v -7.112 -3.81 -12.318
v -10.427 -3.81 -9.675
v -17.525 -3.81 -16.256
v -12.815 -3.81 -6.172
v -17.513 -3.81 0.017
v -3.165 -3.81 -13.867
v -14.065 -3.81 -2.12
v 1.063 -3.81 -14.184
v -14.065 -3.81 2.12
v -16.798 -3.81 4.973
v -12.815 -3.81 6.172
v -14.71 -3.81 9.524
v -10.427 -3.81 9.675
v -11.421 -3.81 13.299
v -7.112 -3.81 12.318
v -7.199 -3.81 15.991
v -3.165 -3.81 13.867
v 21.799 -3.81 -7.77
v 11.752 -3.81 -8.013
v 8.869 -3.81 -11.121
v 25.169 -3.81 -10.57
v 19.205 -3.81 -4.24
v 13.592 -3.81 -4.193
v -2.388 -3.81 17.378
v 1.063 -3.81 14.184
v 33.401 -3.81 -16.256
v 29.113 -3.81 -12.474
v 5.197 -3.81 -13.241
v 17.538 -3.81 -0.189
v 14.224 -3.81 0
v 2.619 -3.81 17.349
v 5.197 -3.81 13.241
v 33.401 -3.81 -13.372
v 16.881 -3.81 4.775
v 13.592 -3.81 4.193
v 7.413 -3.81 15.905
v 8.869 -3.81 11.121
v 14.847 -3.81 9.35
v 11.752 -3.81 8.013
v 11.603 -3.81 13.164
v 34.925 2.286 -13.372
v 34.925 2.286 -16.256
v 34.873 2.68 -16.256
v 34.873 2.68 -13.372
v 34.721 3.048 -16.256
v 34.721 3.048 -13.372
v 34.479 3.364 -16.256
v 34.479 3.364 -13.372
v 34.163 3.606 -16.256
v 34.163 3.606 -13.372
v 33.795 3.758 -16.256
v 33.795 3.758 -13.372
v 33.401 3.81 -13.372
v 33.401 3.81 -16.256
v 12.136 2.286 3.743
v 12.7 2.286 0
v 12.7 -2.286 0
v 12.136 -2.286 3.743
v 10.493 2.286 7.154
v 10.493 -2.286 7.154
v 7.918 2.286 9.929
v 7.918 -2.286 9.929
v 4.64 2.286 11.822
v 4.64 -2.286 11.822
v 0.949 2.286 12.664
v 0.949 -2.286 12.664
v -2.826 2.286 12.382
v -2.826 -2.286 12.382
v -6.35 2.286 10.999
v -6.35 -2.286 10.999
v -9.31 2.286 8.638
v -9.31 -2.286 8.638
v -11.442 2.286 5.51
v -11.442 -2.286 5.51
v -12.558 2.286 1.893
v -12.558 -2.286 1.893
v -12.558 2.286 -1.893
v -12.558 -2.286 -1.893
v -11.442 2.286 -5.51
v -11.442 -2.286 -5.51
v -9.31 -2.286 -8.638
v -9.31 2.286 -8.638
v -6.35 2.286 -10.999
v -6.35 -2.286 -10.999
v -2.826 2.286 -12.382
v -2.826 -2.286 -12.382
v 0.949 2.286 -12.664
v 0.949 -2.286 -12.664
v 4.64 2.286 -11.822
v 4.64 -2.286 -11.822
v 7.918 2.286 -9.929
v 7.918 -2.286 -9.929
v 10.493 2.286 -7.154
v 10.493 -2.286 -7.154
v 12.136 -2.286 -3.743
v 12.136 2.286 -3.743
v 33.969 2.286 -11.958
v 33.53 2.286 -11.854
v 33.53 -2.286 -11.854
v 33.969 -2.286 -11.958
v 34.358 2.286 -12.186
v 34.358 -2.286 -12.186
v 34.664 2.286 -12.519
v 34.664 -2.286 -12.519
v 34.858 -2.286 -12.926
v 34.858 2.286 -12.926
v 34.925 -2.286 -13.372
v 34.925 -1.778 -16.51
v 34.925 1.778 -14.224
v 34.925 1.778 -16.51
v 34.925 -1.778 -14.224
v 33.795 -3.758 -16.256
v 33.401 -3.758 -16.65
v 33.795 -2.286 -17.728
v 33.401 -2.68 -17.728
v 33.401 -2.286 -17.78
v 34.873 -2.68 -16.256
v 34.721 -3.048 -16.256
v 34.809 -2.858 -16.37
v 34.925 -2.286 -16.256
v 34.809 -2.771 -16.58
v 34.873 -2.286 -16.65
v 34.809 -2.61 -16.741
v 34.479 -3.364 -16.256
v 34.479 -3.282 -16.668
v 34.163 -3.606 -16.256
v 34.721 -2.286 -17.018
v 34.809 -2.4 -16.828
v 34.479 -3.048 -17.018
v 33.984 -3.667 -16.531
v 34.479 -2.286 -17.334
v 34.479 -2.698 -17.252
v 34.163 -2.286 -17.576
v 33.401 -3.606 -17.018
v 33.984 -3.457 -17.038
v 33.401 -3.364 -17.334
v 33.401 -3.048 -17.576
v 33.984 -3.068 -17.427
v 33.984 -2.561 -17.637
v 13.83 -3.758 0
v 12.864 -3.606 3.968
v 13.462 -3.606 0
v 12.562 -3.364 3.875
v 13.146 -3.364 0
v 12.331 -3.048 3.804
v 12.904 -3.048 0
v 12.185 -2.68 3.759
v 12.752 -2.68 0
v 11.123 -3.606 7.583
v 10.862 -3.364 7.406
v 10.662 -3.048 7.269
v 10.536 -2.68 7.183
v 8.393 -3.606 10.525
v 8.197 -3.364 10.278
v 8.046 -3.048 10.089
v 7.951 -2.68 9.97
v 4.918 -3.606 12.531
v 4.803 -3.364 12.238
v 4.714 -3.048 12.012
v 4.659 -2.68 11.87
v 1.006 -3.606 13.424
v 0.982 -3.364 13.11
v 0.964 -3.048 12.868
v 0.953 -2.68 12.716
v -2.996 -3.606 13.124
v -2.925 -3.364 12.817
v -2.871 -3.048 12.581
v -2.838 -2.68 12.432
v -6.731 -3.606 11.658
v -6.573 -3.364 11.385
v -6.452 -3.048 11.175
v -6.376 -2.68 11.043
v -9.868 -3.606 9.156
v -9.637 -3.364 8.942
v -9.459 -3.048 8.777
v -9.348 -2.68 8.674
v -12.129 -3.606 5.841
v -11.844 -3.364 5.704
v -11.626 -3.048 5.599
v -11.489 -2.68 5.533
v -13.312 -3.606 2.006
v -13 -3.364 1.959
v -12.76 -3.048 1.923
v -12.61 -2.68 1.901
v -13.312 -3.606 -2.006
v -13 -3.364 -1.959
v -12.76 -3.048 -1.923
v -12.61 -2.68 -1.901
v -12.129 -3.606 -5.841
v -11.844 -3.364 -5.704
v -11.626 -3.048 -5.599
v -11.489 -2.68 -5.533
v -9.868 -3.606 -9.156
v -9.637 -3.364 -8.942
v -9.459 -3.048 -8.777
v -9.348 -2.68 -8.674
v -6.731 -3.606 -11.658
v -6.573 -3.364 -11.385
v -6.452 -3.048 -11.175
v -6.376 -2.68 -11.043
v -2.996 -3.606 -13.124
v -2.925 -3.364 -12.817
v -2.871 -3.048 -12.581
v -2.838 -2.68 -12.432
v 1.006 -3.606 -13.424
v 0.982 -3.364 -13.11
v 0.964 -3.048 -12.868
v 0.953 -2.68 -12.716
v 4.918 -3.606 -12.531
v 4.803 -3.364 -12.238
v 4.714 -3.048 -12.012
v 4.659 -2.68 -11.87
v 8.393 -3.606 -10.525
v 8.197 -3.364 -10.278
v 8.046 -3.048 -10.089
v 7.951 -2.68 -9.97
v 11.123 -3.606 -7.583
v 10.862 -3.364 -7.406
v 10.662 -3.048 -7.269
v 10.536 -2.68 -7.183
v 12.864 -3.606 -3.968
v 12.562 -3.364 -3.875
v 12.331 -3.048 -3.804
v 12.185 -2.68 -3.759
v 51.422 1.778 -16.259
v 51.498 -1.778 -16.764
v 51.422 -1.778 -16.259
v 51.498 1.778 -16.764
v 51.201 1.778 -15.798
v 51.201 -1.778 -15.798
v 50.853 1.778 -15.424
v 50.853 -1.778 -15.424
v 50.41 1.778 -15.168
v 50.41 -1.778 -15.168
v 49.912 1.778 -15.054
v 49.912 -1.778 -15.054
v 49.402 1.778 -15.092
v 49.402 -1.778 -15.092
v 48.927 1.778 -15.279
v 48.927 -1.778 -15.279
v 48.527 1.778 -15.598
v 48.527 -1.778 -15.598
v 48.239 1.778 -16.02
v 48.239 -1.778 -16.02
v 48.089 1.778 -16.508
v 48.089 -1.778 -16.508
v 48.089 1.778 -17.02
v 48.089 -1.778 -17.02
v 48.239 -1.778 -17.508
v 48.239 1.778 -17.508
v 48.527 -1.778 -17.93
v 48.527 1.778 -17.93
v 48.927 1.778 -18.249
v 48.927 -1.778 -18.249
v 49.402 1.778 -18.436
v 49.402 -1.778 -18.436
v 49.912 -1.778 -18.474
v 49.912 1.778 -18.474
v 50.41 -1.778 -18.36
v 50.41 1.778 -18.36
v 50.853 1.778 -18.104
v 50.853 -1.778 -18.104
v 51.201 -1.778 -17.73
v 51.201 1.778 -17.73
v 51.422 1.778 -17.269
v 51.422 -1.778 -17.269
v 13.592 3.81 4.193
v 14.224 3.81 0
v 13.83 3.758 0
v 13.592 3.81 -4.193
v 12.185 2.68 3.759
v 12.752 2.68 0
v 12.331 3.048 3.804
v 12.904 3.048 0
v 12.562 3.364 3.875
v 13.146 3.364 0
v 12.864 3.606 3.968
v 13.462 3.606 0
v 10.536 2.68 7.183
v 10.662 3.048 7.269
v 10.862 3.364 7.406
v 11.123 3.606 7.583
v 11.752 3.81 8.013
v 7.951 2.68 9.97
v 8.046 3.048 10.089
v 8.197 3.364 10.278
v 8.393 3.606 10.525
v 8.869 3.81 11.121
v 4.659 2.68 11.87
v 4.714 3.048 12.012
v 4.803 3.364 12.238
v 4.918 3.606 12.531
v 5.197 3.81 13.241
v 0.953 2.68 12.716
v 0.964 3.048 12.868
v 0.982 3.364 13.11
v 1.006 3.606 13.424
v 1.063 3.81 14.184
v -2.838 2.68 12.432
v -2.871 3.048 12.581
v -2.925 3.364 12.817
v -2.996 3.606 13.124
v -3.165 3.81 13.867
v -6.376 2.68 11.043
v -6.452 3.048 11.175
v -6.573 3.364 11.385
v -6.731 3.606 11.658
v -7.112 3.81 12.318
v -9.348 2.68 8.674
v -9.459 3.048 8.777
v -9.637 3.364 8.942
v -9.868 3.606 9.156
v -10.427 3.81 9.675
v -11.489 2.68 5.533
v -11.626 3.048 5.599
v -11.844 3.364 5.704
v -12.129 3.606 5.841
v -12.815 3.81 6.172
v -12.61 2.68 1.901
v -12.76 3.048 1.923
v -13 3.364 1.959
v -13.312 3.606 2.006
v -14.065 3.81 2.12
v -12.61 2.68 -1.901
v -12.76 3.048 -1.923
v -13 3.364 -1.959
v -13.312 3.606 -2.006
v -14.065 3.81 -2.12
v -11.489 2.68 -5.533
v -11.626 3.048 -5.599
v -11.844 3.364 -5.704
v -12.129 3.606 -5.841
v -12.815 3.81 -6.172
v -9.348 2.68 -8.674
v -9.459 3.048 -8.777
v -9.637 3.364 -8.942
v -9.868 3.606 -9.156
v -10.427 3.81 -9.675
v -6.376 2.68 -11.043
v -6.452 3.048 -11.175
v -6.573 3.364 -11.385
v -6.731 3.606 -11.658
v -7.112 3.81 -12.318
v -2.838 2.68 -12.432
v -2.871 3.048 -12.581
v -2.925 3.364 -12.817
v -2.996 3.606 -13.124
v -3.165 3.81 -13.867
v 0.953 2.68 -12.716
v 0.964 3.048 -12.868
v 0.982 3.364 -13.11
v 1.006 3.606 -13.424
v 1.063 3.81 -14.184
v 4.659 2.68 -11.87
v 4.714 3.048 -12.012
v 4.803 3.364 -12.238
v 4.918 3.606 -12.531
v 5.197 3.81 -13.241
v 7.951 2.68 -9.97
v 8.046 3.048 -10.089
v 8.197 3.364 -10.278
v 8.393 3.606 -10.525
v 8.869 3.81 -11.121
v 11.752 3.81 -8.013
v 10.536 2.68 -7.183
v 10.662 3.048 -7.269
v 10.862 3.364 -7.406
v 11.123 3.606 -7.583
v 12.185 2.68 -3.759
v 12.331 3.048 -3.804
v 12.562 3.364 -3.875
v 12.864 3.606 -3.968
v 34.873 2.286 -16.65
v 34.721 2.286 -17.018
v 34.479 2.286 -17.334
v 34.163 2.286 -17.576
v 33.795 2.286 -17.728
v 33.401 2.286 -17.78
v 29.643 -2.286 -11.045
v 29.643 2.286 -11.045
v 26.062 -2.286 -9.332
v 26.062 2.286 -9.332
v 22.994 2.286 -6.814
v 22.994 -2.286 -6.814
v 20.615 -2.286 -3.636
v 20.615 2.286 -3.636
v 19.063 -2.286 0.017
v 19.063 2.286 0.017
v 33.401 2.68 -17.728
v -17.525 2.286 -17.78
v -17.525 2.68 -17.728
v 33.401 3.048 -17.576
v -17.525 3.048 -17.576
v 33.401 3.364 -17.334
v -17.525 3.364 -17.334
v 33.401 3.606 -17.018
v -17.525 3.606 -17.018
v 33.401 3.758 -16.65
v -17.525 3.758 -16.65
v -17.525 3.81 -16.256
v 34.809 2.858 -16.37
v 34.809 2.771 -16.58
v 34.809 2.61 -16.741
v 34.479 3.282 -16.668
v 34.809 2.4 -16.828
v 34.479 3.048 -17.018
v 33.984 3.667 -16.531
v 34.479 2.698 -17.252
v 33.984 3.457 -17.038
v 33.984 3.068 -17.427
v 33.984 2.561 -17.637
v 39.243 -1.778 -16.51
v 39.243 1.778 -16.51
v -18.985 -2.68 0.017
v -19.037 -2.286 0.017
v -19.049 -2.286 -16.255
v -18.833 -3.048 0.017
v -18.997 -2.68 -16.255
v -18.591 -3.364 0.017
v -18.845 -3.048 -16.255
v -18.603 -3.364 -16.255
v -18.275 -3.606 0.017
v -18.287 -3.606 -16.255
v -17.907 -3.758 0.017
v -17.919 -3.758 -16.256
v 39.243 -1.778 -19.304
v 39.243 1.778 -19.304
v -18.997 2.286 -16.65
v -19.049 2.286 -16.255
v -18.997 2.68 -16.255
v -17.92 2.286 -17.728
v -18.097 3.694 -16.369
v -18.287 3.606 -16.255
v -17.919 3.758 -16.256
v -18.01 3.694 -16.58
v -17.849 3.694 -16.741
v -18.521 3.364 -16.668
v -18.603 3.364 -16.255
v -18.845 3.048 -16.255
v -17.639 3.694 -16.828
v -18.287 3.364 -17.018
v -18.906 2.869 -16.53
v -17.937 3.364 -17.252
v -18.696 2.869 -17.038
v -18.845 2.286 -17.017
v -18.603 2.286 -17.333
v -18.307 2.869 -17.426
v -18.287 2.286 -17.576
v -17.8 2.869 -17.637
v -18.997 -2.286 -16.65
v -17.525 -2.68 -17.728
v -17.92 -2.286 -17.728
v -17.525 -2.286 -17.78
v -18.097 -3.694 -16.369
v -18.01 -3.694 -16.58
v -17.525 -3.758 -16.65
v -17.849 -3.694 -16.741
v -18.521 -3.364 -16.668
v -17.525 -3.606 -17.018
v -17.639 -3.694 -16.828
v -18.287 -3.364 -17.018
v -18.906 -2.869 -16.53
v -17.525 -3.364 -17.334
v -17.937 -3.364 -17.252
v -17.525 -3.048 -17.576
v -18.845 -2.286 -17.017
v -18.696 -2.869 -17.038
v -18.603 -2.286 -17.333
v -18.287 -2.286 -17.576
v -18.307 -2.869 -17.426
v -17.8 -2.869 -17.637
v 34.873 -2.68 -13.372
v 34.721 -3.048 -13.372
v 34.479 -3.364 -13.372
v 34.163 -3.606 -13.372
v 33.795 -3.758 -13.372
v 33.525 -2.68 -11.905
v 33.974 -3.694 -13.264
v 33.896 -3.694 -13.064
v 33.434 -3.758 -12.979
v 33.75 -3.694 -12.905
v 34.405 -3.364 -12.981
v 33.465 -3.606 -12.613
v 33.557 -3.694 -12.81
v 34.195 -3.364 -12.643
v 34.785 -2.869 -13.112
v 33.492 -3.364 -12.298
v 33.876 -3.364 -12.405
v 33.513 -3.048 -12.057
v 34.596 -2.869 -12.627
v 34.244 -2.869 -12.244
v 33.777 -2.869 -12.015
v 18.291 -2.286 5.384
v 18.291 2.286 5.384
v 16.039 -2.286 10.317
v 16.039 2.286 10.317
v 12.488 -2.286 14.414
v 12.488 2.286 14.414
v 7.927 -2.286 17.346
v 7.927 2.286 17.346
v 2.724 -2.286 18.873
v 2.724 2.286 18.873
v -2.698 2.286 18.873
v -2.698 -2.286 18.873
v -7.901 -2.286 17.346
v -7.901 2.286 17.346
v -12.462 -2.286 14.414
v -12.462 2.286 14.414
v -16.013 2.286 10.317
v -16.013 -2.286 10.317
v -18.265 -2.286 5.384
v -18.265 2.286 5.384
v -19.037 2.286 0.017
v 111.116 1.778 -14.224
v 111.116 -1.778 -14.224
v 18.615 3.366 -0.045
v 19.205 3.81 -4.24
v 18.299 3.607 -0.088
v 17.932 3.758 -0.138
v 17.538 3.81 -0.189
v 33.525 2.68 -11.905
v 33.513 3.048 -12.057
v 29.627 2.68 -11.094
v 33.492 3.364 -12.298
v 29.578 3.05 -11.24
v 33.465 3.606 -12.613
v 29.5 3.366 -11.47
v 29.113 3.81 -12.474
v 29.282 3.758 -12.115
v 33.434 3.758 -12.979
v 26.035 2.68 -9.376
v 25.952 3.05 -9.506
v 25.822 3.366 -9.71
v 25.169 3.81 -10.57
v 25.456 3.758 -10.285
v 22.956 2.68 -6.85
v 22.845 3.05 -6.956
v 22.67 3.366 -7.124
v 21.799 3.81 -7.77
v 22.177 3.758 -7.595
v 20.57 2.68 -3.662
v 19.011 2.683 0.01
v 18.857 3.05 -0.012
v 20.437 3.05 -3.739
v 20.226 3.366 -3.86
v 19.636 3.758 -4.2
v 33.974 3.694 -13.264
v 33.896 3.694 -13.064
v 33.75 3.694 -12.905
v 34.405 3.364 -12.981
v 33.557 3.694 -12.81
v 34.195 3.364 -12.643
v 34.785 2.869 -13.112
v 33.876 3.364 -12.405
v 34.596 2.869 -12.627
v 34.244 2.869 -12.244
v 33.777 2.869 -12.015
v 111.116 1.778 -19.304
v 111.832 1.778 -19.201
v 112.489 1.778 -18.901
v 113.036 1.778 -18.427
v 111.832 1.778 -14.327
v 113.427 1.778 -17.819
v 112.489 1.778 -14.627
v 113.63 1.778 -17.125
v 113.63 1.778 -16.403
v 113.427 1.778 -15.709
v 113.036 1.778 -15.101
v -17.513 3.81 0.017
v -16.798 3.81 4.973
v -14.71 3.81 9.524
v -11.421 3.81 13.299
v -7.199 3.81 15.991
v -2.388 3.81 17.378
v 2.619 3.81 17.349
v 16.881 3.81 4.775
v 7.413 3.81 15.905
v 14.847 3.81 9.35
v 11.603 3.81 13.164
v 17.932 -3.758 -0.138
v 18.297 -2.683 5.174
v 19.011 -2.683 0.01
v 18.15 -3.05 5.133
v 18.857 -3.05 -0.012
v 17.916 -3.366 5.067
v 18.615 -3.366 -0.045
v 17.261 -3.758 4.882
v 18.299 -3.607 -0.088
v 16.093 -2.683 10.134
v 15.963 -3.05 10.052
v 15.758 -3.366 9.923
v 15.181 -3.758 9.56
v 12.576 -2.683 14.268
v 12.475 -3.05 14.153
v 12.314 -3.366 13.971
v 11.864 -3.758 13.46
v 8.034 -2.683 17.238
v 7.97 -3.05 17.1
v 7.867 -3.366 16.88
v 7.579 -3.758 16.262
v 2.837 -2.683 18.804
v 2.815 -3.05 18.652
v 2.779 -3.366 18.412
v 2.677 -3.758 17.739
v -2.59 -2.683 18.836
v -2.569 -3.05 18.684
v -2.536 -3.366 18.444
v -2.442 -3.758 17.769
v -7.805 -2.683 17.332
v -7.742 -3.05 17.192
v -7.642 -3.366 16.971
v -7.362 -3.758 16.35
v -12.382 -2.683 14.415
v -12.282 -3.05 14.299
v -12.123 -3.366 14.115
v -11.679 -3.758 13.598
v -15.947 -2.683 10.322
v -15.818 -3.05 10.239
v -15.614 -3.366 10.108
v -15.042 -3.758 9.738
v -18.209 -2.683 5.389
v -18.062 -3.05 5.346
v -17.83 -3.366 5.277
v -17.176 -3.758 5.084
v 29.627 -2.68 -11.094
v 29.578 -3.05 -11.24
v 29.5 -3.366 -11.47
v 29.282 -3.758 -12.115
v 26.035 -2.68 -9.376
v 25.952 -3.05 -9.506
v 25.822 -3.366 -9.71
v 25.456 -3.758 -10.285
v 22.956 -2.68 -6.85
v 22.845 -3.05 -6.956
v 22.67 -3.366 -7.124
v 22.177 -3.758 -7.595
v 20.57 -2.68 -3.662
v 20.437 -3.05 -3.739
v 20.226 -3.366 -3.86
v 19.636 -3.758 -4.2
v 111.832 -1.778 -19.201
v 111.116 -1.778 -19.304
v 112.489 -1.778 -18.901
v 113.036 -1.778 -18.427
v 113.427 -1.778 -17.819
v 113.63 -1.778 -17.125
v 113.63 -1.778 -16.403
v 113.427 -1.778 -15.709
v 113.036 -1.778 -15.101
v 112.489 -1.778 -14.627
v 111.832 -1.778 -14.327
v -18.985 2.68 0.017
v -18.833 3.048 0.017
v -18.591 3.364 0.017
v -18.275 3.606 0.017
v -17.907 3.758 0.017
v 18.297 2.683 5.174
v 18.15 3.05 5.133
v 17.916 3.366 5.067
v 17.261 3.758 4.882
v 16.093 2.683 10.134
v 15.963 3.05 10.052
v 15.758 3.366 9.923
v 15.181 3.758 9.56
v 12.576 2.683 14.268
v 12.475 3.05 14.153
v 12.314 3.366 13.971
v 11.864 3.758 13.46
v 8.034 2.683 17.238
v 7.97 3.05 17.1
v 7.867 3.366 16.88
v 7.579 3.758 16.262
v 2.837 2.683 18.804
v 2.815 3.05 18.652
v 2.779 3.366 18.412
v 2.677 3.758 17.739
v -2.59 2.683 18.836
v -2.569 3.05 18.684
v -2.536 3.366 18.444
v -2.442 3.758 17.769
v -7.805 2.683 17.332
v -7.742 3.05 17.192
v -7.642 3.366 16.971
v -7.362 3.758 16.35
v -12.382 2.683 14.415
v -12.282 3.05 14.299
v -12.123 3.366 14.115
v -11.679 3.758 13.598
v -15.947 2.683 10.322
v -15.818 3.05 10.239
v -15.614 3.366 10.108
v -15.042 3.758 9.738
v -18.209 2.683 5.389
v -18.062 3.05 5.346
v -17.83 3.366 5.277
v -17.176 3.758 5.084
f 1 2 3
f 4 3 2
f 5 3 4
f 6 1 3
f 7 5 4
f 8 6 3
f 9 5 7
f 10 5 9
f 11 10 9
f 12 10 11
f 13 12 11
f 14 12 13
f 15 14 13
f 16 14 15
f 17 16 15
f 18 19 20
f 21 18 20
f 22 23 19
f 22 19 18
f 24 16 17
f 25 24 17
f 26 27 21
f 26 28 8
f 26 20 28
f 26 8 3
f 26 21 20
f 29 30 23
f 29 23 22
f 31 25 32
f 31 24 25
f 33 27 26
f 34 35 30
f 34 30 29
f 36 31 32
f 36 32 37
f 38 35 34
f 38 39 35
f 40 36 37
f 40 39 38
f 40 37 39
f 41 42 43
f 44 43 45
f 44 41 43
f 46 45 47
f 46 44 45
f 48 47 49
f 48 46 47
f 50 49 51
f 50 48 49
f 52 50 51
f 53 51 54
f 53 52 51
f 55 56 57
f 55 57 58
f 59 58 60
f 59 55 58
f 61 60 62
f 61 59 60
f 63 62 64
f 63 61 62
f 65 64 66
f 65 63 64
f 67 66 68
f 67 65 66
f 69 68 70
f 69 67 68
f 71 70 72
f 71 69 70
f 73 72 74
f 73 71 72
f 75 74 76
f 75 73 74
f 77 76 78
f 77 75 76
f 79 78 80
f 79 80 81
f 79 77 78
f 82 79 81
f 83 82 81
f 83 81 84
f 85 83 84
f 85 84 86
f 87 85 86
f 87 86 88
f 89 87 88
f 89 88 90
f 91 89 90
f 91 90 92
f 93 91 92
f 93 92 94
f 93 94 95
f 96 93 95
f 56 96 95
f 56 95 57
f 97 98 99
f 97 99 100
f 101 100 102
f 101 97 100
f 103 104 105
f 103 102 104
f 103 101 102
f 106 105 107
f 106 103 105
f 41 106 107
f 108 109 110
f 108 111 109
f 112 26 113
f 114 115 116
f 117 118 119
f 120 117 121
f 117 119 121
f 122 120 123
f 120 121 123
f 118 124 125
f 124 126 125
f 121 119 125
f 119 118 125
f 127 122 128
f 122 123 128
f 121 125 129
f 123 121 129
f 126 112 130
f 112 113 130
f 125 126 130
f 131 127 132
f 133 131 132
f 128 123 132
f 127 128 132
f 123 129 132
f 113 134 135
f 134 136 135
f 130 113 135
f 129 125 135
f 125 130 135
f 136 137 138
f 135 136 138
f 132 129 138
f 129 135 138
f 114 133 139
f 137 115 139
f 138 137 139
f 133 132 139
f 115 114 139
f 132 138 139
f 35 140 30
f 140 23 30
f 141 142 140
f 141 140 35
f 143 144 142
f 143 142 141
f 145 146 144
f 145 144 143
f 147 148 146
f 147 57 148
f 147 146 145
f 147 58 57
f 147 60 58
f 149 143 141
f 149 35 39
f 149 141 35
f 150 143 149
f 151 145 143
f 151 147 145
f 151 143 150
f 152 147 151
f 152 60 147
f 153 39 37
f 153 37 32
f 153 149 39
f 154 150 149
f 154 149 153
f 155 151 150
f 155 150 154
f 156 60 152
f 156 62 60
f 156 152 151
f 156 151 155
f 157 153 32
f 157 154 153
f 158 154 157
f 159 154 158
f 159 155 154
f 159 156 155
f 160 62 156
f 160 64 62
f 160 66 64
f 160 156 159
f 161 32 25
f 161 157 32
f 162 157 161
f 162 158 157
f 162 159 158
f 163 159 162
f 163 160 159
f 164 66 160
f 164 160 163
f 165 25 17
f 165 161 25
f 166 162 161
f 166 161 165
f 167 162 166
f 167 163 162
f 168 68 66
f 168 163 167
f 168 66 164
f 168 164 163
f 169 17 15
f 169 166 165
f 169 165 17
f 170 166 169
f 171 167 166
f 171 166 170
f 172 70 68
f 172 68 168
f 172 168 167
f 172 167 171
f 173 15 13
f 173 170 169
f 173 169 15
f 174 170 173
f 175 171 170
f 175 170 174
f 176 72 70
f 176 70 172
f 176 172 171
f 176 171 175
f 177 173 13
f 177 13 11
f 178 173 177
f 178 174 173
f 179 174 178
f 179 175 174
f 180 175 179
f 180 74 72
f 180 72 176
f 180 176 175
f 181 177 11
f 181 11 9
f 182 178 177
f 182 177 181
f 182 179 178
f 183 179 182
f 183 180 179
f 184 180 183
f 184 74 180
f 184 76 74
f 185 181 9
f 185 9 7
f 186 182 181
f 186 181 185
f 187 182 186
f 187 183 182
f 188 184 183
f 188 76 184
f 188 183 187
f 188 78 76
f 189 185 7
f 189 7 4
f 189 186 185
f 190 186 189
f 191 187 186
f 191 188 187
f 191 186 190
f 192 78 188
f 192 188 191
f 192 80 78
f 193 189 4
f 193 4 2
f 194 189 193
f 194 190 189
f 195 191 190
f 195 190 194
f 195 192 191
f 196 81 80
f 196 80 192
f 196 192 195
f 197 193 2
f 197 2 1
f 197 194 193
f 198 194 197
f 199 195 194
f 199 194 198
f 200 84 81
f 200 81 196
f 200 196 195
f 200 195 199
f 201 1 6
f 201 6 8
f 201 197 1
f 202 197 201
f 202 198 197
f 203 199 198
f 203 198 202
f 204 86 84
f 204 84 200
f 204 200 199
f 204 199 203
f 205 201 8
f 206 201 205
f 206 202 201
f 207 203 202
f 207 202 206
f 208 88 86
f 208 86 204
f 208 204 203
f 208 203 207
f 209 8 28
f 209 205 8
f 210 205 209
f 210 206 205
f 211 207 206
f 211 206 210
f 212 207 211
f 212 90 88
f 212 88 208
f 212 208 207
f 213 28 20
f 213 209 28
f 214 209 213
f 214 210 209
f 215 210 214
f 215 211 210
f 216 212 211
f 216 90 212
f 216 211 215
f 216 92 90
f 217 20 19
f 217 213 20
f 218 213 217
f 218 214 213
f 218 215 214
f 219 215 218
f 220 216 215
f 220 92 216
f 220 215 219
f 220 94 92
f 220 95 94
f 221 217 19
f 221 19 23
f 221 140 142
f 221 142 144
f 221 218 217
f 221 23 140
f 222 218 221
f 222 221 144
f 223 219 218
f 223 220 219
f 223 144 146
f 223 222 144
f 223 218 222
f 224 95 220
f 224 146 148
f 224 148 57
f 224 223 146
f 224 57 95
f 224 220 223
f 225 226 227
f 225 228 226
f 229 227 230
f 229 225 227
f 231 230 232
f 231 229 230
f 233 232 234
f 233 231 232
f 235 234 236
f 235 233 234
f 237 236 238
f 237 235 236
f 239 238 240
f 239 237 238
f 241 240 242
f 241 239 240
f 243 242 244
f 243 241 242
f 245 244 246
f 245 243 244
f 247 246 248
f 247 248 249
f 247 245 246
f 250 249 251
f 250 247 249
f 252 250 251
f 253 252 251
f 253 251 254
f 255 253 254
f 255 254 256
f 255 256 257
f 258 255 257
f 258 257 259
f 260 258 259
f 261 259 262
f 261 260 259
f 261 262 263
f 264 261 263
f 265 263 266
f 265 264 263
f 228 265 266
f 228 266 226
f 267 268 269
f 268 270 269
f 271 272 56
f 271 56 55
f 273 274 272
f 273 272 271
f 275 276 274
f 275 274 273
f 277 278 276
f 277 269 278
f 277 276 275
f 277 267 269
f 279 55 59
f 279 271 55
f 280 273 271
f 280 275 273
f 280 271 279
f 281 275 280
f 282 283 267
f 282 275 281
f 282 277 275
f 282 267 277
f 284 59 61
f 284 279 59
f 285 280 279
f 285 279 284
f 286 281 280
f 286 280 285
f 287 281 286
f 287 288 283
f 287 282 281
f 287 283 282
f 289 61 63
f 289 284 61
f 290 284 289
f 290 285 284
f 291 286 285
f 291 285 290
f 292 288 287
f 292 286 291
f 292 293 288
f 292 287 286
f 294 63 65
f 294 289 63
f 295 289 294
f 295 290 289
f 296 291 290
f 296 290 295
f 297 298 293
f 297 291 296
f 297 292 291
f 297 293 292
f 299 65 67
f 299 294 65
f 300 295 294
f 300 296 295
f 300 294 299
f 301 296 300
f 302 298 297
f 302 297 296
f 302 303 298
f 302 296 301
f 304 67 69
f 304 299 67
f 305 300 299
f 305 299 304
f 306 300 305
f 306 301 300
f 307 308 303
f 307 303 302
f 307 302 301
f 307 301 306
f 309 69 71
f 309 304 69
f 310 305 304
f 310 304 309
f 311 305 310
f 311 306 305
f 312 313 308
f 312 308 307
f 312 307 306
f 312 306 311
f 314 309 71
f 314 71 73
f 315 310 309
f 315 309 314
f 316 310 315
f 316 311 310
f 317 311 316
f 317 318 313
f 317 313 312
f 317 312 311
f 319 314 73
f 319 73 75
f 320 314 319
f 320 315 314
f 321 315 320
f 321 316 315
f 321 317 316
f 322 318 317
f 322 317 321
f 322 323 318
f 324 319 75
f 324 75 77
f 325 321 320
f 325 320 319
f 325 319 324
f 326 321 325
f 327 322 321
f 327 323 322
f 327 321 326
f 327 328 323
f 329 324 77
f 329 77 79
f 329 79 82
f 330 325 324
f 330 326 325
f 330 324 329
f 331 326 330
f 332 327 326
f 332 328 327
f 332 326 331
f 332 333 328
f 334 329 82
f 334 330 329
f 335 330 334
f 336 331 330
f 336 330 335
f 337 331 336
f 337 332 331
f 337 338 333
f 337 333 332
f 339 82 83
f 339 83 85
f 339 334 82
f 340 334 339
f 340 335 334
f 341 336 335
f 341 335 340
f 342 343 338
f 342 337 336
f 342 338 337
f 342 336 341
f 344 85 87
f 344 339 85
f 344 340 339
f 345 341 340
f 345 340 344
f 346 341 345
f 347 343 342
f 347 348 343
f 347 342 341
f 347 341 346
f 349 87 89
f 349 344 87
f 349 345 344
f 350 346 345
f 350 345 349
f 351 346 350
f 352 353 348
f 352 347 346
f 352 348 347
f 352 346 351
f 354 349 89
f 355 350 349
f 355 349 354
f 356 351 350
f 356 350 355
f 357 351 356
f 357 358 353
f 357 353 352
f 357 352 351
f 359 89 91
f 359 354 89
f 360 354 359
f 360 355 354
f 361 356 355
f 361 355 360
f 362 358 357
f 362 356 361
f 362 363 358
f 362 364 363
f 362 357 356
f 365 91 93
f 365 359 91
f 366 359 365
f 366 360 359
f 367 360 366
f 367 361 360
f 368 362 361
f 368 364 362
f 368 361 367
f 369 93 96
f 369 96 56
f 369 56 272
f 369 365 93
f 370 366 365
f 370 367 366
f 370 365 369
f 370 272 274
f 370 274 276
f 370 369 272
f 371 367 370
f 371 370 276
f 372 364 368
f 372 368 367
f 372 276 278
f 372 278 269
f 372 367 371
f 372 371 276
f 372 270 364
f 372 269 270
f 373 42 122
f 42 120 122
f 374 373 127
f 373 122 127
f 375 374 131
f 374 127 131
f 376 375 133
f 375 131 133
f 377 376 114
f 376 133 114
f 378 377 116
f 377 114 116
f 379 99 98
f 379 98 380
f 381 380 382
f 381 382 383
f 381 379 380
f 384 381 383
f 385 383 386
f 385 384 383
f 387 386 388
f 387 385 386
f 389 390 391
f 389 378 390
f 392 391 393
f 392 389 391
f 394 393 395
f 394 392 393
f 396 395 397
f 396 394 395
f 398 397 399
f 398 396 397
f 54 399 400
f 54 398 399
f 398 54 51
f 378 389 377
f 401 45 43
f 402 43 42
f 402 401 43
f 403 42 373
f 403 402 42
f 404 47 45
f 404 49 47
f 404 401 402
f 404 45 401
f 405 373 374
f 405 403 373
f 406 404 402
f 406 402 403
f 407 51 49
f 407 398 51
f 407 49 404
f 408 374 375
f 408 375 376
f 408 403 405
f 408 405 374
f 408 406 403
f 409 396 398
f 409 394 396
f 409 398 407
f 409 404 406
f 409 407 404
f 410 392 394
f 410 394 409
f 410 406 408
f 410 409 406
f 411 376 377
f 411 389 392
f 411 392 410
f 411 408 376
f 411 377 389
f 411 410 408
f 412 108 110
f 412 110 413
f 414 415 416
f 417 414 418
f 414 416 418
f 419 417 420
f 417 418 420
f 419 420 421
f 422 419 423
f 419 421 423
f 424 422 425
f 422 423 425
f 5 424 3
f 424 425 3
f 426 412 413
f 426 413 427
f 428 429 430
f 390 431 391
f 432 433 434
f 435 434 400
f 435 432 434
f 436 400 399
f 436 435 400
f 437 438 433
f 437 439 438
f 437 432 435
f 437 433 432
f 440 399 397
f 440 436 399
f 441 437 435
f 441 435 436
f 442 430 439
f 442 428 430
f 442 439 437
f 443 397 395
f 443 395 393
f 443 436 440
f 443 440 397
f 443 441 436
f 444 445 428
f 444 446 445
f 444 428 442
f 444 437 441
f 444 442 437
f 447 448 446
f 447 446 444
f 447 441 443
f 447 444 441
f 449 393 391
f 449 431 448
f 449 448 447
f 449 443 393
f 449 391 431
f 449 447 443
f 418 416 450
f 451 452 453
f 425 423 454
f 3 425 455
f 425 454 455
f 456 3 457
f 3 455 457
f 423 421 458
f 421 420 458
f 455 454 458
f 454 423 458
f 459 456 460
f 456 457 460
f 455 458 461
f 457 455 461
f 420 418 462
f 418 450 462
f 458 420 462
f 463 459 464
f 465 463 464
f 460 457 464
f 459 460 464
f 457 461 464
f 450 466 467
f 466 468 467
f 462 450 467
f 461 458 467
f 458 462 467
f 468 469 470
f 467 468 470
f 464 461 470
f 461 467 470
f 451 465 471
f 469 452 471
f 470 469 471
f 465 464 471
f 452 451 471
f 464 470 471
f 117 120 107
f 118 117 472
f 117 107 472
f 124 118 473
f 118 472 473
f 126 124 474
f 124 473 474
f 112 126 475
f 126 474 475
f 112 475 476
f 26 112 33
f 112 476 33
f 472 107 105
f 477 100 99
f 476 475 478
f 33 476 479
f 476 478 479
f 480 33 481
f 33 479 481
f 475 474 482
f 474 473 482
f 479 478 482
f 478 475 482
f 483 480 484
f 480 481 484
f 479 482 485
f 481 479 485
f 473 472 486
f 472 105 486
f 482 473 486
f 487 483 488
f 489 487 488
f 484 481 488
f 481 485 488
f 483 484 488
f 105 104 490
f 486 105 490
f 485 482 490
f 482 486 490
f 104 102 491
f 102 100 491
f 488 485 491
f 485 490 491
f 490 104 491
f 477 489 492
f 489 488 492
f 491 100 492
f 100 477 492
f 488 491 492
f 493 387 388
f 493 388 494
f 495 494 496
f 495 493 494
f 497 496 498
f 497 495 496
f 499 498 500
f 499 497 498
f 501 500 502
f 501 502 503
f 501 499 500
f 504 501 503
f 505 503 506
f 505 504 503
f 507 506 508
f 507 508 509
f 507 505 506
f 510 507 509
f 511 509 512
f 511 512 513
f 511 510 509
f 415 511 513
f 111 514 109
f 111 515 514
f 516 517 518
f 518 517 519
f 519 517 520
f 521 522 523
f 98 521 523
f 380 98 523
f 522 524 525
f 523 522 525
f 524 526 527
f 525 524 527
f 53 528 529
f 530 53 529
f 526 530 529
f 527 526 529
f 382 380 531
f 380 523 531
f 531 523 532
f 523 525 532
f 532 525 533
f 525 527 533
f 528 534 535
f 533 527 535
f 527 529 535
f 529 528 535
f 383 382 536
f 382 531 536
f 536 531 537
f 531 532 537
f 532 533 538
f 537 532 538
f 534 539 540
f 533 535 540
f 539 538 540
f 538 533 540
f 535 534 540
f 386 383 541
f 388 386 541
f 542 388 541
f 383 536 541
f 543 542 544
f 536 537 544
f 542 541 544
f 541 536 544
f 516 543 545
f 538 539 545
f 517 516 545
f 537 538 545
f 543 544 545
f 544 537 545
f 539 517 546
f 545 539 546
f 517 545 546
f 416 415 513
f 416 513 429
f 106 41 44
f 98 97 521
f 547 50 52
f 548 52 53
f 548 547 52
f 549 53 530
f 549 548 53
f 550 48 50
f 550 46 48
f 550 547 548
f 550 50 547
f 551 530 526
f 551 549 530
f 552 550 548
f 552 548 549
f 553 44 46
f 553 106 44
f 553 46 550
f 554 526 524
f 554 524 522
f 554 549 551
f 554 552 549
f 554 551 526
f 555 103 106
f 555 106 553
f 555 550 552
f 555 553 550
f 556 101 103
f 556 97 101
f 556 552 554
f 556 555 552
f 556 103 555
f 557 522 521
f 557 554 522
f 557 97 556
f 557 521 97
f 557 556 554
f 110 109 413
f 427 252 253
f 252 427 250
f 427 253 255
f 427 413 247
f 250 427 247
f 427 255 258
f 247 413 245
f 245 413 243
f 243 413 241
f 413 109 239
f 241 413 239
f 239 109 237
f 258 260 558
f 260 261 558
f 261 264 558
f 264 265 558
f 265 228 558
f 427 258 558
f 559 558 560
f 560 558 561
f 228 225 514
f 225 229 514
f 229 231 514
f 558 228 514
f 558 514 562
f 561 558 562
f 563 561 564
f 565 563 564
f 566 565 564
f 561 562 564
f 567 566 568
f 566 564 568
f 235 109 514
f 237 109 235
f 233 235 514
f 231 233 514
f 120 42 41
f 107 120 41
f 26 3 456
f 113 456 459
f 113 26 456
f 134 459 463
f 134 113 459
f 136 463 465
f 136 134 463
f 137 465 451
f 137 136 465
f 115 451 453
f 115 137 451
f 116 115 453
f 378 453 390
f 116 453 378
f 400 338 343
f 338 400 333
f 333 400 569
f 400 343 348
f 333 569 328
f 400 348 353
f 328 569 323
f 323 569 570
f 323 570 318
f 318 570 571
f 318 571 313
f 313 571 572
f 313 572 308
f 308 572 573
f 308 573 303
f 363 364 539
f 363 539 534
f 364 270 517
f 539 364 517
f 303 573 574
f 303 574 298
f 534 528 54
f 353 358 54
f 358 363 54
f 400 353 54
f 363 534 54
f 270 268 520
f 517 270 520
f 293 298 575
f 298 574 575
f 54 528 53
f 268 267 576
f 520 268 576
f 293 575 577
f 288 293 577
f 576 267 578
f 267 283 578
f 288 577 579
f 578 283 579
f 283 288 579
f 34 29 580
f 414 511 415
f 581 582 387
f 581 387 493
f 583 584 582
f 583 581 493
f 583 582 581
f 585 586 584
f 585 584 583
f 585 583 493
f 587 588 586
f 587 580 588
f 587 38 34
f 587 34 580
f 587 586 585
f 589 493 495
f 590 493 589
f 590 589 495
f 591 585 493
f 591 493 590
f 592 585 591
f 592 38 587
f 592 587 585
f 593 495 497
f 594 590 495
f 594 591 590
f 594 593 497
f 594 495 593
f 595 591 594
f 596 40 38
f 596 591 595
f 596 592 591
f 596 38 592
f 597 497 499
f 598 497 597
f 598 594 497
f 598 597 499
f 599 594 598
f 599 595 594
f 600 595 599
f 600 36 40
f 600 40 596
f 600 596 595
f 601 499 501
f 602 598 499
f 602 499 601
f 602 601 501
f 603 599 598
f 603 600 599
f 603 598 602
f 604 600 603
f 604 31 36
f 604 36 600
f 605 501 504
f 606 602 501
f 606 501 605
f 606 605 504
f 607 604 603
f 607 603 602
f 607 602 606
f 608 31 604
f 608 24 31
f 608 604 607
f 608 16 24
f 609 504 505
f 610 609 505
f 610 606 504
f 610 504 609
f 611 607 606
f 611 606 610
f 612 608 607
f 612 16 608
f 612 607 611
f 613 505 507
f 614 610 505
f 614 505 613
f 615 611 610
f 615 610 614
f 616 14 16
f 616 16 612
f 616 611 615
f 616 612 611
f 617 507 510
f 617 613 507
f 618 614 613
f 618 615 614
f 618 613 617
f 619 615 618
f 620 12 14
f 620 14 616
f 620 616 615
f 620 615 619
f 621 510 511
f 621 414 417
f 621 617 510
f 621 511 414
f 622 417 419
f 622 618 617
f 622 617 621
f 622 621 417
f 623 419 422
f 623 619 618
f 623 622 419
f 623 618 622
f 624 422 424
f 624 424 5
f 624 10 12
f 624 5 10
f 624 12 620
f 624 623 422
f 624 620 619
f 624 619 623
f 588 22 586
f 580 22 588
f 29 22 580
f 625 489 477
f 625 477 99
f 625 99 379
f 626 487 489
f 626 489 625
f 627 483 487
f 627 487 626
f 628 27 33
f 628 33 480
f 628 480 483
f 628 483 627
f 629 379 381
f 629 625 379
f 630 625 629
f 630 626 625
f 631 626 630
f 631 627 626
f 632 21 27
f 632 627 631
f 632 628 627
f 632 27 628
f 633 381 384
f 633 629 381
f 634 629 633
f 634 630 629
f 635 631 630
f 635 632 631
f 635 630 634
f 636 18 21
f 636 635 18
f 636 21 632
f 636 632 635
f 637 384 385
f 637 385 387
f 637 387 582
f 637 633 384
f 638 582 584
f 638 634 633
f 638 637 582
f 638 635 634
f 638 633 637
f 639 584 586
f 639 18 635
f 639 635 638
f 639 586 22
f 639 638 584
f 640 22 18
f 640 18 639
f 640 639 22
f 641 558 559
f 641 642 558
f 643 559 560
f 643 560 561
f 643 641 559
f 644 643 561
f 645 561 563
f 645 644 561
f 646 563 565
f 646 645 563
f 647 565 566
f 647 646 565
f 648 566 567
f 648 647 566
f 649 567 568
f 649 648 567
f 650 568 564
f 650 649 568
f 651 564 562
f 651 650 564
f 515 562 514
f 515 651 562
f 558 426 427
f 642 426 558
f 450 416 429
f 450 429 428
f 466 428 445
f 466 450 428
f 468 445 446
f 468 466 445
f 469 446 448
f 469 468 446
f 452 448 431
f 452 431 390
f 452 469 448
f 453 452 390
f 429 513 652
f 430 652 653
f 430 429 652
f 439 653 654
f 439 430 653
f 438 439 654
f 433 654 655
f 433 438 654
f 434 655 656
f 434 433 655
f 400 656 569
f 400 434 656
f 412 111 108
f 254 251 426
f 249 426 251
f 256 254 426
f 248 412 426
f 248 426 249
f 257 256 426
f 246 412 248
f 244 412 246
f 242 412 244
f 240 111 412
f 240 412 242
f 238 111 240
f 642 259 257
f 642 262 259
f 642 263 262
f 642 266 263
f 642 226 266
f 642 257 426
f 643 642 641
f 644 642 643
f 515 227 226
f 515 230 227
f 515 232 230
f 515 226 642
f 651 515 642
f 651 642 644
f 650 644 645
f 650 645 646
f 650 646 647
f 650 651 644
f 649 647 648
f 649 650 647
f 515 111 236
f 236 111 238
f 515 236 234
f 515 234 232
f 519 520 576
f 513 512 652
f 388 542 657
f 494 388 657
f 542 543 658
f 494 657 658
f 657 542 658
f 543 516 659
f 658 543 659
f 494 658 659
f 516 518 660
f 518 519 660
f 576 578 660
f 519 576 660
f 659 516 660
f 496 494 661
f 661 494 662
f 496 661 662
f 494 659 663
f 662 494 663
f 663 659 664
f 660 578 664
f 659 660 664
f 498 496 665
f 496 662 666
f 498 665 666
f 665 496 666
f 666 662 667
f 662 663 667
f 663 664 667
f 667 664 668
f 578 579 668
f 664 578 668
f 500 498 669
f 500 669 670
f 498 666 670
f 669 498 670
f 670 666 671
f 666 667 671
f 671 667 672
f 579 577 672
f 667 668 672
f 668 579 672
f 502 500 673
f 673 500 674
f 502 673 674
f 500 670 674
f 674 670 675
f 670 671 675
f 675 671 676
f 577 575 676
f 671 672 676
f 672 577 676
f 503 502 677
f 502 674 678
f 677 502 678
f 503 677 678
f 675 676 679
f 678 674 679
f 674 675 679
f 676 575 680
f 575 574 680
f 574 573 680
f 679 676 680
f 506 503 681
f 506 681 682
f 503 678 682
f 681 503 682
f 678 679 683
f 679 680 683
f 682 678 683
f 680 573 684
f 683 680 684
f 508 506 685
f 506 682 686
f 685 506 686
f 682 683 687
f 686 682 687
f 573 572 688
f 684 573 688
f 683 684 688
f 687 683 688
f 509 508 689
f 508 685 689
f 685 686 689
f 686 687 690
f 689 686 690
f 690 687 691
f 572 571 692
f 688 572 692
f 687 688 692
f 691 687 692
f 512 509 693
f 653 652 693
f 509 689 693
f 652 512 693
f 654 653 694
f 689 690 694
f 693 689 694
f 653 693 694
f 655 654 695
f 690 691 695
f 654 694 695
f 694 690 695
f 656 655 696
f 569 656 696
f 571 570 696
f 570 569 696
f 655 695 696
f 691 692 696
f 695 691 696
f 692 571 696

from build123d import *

# Parameters (mm, degrees)
F0_R     = 1.7145
F1_DEPTH = 1.778
F0_R_2   = 12.7
F2_DEPTH = 3.81
F3_R     = 1.524


with BuildPart() as f1:
    # F0 (on Front) → F1 (new body, symmetric)
    with BuildSketch(Plane.XZ):
        with BuildLine():
            Line((34.925, -14.2239901728), (34.925, -16.5099901728))
            Line((34.925, -16.5099901728), (39.243, -16.5099901728))
            Line((39.243, -16.5099901728), (39.243, -19.3039901728))
            Line((39.243, -19.3039901728), (111.1161178446, -19.3039901728))
            ThreePointArc((111.1161178446, -19.3039901728), (113.6561178446, -16.7639901728), (111.1161178446, -14.2239901728))
            Line((111.1161178446, -14.2239901728), (34.925, -14.2239901728))
        make_face()
        with Locations((49.784, -16.7639901728)):
            Circle(F0_R, mode=Mode.SUBTRACT)
    extrude(amount=F1_DEPTH, both=True)


with BuildPart() as f2:
    # F0 (on Front) → F2 (new body, symmetric)
    with BuildSketch(Plane.XZ):
        with BuildLine():
            Line((-19.036992955, 0.0173138134), (-19.05, -17.78))
            Line((-19.05, -17.78), (34.925, -17.78))
            Line((34.925, -17.78), (34.925, -16.5099901728))
            Line((34.925, -16.5099901728), (34.925, -14.2239901728))
            Line((34.925, -14.2239901728), (34.925, -11.9125901728))
            ThreePointArc((34.925, -11.9125901728), (25.0012226241, -8.5972384286), (19.063007045, 0.0173138134))
            ThreePointArc((19.063007045, 0.0173138134), (0.013007045, 19.0673138134), (-19.036992955, 0.0173138134))
        make_face()
        Circle(F0_R_2, mode=Mode.SUBTRACT)
    extrude(amount=F2_DEPTH, both=True)

    # F3
    f3_edges = [f2.edges().sort_by_distance(p)[0] for p in [
        (-19.043496, -3.81, -8.881343),
        (7.9375, -3.81, -17.78),
        (34.925, -3.81, -14.846295),
        (25.001223, -3.81, -8.597238),
        (0.013007, -3.81, 19.067314),
        (-12.7, -3.81, 0),
        (-19.043496, 3.81, -8.881343),
        (7.9375, 3.81, -17.78),
        (34.925, 3.81, -14.846295),
        (25.001223, 3.81, -8.597238),
        (0.013007, 3.81, 19.067314),
        (-12.7, 3.81, 0),
        (34.925, 0, -17.78),
        (34.925, 0, -11.91259),
        (-19.05, 0, -17.78),
    ]]
    fillet(f3_edges, radius=F3_R)


solid = Compound([f1.part, f2.part])
